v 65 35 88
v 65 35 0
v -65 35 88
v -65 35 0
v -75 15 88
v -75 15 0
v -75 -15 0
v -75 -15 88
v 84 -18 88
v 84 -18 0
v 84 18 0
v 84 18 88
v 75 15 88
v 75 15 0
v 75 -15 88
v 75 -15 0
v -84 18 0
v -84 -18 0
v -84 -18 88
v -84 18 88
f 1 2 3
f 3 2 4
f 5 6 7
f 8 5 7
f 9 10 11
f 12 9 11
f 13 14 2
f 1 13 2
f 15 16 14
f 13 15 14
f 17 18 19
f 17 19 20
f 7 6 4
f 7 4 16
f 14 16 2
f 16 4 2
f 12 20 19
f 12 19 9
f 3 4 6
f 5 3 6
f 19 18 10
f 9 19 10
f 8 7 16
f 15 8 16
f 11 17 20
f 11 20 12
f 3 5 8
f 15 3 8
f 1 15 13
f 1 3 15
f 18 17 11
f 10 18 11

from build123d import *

# Parameters (mm, degrees)
F0_W     = 168
F0_H     = 36
F1_DEPTH = 88
F3_DEPTH = 88


with BuildPart() as f1:
    # F0 (on Top) → F1 (new body)
    with BuildSketch(Plane.XY):
        Rectangle(F0_W, F0_H)
    extrude(amount=F1_DEPTH)


with BuildPart() as f3:
    # F2 (on Top) → F3 (new body)
    with BuildSketch(Plane.XY):
        Polygon((-75, -15), (75, -15), (75, 15), (65, 35), (-65, 35), (-75, 15), align=None)
    extrude(amount=F3_DEPTH)


solid = Compound([f1.part, f3.part])
